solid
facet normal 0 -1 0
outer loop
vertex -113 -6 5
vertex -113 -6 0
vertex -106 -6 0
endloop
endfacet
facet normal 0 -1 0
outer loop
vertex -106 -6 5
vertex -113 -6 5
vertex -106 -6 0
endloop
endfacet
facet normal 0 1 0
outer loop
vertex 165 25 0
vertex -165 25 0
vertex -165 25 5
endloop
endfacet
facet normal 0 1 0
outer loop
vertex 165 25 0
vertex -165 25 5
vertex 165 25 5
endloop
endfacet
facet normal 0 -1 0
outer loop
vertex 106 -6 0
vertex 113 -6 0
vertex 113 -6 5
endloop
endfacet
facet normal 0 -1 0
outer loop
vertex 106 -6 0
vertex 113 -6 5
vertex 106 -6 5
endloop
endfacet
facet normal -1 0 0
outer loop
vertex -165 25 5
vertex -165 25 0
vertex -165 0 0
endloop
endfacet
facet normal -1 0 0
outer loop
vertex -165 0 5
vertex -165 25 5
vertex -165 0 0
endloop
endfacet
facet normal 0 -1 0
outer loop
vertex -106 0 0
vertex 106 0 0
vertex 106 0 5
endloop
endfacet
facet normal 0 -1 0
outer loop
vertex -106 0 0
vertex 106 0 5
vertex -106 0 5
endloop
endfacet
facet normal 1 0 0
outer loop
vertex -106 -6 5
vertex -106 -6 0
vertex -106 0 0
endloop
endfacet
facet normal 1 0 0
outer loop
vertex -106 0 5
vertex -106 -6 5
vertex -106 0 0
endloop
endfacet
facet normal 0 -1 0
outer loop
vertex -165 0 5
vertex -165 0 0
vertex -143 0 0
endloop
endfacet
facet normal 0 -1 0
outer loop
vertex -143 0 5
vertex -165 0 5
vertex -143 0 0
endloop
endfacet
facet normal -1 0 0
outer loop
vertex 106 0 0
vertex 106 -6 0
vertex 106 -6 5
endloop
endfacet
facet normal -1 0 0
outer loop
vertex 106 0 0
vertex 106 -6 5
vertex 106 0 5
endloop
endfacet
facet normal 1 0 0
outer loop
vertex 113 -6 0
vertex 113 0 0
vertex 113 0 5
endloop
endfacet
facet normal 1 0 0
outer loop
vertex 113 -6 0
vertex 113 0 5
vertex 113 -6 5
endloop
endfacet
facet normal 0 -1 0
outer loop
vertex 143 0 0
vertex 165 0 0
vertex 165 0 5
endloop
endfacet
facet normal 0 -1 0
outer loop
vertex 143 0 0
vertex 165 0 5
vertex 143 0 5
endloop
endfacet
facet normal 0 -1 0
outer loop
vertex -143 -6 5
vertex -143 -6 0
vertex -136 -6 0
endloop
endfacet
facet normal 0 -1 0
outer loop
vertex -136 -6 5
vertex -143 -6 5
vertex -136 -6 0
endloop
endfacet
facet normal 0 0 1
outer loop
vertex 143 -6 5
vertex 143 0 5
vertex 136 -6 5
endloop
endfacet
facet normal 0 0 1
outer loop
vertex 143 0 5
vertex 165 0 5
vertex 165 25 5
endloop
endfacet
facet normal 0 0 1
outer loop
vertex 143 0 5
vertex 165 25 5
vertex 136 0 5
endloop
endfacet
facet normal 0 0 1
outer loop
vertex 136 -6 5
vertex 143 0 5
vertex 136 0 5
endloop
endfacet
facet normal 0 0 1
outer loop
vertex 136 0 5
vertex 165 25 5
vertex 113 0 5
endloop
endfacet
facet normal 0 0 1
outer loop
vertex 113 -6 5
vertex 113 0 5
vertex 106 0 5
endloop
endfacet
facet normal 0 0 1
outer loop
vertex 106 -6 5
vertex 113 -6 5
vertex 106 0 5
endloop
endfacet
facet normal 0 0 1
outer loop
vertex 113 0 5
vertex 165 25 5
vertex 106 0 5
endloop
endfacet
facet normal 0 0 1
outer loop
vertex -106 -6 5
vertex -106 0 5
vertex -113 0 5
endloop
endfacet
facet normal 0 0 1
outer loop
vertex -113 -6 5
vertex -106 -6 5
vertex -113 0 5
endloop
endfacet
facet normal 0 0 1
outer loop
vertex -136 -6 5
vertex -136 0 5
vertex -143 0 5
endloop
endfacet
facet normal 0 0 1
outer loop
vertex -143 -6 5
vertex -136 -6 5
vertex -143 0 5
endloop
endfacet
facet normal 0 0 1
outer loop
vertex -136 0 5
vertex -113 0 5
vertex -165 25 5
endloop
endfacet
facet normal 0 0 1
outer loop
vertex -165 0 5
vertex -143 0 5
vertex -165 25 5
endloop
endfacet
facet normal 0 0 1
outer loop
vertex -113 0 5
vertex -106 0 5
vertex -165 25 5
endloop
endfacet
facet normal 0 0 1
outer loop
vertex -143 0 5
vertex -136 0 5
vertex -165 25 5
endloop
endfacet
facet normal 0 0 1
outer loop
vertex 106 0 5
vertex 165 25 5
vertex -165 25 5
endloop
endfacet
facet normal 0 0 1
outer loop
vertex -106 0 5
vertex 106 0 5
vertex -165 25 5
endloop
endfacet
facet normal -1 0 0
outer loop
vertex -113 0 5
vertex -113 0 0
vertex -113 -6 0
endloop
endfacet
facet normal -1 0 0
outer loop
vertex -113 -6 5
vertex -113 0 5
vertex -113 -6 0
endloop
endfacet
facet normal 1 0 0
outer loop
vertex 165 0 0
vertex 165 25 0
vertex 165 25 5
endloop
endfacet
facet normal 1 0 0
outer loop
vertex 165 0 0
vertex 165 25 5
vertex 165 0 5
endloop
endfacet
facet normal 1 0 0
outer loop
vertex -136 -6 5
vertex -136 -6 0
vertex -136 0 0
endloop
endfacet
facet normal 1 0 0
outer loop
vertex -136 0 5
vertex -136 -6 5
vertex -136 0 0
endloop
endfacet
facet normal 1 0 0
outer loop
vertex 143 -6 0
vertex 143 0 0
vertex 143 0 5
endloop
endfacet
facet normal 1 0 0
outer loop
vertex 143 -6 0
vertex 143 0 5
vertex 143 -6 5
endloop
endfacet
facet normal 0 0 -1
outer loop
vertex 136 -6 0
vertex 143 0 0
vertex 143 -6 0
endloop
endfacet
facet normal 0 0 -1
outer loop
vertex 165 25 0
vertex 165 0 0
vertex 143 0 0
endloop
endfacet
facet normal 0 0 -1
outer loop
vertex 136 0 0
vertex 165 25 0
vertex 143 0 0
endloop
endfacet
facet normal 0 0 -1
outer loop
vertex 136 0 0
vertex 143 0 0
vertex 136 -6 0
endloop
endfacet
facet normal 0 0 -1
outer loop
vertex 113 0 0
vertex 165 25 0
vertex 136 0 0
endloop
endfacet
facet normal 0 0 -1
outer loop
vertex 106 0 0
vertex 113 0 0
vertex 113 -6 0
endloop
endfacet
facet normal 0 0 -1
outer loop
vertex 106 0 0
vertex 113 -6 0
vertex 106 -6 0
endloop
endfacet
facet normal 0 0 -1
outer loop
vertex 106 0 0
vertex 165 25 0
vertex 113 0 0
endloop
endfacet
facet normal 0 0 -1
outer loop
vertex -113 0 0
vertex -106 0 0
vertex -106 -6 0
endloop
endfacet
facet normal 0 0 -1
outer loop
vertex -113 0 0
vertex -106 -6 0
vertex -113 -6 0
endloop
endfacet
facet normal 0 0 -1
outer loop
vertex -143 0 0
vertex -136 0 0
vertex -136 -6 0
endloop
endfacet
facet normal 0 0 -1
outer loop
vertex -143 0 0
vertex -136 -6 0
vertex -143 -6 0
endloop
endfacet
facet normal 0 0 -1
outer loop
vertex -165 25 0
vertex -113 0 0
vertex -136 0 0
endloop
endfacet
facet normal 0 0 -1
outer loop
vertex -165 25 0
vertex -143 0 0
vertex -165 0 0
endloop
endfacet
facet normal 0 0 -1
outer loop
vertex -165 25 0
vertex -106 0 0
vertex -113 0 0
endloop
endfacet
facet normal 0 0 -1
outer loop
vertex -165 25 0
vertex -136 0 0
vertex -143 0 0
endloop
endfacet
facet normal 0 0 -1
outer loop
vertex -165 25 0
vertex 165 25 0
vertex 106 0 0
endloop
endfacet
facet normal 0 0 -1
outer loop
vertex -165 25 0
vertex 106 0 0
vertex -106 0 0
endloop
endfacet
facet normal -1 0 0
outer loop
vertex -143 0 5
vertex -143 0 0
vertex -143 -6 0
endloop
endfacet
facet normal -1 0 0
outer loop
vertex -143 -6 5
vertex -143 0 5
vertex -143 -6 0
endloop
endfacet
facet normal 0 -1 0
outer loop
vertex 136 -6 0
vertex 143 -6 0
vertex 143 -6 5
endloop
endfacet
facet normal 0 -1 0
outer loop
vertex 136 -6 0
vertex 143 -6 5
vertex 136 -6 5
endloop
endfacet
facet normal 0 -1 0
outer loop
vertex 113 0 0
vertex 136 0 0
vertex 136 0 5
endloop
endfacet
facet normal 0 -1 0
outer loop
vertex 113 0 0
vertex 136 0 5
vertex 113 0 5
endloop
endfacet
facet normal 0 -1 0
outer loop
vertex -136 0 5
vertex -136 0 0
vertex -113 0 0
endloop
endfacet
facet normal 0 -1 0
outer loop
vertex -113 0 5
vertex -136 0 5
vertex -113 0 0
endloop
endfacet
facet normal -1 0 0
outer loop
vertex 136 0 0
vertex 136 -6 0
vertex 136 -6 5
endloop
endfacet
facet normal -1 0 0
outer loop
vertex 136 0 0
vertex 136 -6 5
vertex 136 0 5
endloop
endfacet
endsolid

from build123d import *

# Parameters (mm, degrees)
F1_DEPTH = 5


with BuildPart() as f1:
    # F0 (on Top) → F1 (new body)
    with BuildSketch(Plane.XY):
        Polygon((-106, 0), (0, 0), (0, 25), (-165, 25), (-165, 0), (-143, 0), (-143, -6), (-136, -6), (-136, 0), (-113, 0), (-113, -6), (-106, -6), align=None)
    extrude(amount=F1_DEPTH)

    # F2: F1 across face


with BuildPart() as f1_1:
    add(f1.part)
    add(f1.part.mirror(Plane(origin=(0, 12.5, 2.5), x_dir=(0, 1, 0), z_dir=(1, 0, 0))))


solid = f1_1.part
